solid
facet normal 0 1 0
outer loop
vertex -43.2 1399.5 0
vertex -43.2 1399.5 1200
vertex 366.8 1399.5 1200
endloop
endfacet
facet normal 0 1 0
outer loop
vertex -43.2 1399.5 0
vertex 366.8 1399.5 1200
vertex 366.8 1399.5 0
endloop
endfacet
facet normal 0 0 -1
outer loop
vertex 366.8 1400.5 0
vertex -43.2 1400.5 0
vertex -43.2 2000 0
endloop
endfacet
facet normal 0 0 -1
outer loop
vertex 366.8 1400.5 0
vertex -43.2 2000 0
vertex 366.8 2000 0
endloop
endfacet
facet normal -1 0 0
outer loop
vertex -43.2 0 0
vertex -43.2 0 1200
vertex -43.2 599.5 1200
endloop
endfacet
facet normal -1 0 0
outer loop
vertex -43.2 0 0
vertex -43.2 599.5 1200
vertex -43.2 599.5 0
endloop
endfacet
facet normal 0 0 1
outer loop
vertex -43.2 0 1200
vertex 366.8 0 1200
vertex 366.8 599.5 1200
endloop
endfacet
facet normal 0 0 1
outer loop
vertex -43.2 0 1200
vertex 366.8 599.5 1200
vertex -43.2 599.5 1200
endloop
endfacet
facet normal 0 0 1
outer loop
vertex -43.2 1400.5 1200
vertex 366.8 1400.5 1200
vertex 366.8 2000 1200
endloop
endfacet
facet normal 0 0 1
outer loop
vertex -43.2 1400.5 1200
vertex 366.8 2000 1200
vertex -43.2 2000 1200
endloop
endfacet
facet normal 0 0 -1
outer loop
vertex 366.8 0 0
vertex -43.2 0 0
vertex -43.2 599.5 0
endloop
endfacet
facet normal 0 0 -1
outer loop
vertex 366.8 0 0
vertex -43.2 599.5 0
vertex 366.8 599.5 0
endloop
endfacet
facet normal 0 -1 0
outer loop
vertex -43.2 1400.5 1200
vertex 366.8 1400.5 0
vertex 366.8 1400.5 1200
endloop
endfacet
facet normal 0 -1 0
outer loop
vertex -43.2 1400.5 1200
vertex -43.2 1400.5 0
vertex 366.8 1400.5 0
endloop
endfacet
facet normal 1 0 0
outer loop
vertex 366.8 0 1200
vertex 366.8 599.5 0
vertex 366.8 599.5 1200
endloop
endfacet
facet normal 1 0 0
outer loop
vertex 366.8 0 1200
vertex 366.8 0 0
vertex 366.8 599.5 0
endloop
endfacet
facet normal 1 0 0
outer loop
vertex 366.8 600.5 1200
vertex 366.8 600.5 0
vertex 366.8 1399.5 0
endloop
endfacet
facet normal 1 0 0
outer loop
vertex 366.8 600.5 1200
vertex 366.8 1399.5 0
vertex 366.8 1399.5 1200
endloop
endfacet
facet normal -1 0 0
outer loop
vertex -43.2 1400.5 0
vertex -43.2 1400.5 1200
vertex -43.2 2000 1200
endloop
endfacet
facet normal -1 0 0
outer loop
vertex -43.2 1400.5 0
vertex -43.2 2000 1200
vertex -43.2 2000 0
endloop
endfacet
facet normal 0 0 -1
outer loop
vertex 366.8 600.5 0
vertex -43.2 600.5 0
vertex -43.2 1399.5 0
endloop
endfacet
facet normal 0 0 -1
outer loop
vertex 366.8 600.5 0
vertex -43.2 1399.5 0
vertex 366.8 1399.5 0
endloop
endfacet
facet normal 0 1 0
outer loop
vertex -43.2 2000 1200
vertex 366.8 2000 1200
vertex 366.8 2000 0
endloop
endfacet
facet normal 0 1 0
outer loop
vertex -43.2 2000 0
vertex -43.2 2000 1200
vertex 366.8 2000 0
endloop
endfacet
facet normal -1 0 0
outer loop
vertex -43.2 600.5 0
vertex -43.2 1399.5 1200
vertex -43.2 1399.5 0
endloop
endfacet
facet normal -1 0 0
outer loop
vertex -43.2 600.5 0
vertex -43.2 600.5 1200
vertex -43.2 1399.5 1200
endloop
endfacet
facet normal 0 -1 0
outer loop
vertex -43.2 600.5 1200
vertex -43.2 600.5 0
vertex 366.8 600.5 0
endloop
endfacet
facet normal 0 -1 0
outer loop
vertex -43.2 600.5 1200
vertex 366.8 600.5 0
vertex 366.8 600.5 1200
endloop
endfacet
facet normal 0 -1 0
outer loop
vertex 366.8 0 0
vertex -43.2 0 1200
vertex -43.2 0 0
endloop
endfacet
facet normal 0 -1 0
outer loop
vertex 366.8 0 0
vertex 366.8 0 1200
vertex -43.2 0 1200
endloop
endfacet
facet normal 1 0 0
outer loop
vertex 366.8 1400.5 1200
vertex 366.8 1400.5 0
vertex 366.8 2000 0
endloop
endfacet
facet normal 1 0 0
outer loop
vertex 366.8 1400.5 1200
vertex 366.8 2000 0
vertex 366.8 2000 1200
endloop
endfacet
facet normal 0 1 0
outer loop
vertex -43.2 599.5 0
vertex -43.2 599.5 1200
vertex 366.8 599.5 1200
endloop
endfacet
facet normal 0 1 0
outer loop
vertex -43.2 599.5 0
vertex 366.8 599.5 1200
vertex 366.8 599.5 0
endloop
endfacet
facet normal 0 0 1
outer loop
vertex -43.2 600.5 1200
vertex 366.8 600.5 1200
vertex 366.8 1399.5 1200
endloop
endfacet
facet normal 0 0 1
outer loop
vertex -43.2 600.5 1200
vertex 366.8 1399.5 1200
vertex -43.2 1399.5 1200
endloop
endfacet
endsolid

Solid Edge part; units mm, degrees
sketch "Sketch1" plane through (0, 0, 0) normal (0, -1, 0) x (1, 0, 0)
  line L0 (-43.2, 0) -> (366.8, 0)
  line L1 (366.8, 0) -> (366.8, 1200)
  line L2 (366.8, 1200) -> (-43.2, 1200)
  line L3 (-43.2, 1200) -> (-43.2, 0)
  dimension "D1" = 1200
  dimension "D2" = 410
extrude "Protrusion1" add sketch "Sketch1" against normal blind 2000
sketch "Sketch2" plane through (-43.2, 1000, 600) normal (-1, 0, 0) x (0, 0, 1)
  line L0 (600, -399.5) -> (600, -400.5)
  line L1 (600, -400.5) -> (-600, -400.5)
  line L2 (-600, -400.5) -> (-600, -399.5)
  line L3 (-600, -399.5) -> (600, -399.5)
  line L4 (600, 400.5) -> (600, 399.5)
  line L5 (600, 399.5) -> (-600, 399.5)
  line L6 (-600, 399.5) -> (-600, 400.5)
  line L7 (-600, 400.5) -> (600, 400.5)
  dimension "D1" = 1
  dimension "D2" = 1
  dimension "D3" = 600
  dimension "D4" = 600
extrude "Cutout1" cut sketch "Sketch2" against normal up to next
properties material "Stainless Steel, 304"
